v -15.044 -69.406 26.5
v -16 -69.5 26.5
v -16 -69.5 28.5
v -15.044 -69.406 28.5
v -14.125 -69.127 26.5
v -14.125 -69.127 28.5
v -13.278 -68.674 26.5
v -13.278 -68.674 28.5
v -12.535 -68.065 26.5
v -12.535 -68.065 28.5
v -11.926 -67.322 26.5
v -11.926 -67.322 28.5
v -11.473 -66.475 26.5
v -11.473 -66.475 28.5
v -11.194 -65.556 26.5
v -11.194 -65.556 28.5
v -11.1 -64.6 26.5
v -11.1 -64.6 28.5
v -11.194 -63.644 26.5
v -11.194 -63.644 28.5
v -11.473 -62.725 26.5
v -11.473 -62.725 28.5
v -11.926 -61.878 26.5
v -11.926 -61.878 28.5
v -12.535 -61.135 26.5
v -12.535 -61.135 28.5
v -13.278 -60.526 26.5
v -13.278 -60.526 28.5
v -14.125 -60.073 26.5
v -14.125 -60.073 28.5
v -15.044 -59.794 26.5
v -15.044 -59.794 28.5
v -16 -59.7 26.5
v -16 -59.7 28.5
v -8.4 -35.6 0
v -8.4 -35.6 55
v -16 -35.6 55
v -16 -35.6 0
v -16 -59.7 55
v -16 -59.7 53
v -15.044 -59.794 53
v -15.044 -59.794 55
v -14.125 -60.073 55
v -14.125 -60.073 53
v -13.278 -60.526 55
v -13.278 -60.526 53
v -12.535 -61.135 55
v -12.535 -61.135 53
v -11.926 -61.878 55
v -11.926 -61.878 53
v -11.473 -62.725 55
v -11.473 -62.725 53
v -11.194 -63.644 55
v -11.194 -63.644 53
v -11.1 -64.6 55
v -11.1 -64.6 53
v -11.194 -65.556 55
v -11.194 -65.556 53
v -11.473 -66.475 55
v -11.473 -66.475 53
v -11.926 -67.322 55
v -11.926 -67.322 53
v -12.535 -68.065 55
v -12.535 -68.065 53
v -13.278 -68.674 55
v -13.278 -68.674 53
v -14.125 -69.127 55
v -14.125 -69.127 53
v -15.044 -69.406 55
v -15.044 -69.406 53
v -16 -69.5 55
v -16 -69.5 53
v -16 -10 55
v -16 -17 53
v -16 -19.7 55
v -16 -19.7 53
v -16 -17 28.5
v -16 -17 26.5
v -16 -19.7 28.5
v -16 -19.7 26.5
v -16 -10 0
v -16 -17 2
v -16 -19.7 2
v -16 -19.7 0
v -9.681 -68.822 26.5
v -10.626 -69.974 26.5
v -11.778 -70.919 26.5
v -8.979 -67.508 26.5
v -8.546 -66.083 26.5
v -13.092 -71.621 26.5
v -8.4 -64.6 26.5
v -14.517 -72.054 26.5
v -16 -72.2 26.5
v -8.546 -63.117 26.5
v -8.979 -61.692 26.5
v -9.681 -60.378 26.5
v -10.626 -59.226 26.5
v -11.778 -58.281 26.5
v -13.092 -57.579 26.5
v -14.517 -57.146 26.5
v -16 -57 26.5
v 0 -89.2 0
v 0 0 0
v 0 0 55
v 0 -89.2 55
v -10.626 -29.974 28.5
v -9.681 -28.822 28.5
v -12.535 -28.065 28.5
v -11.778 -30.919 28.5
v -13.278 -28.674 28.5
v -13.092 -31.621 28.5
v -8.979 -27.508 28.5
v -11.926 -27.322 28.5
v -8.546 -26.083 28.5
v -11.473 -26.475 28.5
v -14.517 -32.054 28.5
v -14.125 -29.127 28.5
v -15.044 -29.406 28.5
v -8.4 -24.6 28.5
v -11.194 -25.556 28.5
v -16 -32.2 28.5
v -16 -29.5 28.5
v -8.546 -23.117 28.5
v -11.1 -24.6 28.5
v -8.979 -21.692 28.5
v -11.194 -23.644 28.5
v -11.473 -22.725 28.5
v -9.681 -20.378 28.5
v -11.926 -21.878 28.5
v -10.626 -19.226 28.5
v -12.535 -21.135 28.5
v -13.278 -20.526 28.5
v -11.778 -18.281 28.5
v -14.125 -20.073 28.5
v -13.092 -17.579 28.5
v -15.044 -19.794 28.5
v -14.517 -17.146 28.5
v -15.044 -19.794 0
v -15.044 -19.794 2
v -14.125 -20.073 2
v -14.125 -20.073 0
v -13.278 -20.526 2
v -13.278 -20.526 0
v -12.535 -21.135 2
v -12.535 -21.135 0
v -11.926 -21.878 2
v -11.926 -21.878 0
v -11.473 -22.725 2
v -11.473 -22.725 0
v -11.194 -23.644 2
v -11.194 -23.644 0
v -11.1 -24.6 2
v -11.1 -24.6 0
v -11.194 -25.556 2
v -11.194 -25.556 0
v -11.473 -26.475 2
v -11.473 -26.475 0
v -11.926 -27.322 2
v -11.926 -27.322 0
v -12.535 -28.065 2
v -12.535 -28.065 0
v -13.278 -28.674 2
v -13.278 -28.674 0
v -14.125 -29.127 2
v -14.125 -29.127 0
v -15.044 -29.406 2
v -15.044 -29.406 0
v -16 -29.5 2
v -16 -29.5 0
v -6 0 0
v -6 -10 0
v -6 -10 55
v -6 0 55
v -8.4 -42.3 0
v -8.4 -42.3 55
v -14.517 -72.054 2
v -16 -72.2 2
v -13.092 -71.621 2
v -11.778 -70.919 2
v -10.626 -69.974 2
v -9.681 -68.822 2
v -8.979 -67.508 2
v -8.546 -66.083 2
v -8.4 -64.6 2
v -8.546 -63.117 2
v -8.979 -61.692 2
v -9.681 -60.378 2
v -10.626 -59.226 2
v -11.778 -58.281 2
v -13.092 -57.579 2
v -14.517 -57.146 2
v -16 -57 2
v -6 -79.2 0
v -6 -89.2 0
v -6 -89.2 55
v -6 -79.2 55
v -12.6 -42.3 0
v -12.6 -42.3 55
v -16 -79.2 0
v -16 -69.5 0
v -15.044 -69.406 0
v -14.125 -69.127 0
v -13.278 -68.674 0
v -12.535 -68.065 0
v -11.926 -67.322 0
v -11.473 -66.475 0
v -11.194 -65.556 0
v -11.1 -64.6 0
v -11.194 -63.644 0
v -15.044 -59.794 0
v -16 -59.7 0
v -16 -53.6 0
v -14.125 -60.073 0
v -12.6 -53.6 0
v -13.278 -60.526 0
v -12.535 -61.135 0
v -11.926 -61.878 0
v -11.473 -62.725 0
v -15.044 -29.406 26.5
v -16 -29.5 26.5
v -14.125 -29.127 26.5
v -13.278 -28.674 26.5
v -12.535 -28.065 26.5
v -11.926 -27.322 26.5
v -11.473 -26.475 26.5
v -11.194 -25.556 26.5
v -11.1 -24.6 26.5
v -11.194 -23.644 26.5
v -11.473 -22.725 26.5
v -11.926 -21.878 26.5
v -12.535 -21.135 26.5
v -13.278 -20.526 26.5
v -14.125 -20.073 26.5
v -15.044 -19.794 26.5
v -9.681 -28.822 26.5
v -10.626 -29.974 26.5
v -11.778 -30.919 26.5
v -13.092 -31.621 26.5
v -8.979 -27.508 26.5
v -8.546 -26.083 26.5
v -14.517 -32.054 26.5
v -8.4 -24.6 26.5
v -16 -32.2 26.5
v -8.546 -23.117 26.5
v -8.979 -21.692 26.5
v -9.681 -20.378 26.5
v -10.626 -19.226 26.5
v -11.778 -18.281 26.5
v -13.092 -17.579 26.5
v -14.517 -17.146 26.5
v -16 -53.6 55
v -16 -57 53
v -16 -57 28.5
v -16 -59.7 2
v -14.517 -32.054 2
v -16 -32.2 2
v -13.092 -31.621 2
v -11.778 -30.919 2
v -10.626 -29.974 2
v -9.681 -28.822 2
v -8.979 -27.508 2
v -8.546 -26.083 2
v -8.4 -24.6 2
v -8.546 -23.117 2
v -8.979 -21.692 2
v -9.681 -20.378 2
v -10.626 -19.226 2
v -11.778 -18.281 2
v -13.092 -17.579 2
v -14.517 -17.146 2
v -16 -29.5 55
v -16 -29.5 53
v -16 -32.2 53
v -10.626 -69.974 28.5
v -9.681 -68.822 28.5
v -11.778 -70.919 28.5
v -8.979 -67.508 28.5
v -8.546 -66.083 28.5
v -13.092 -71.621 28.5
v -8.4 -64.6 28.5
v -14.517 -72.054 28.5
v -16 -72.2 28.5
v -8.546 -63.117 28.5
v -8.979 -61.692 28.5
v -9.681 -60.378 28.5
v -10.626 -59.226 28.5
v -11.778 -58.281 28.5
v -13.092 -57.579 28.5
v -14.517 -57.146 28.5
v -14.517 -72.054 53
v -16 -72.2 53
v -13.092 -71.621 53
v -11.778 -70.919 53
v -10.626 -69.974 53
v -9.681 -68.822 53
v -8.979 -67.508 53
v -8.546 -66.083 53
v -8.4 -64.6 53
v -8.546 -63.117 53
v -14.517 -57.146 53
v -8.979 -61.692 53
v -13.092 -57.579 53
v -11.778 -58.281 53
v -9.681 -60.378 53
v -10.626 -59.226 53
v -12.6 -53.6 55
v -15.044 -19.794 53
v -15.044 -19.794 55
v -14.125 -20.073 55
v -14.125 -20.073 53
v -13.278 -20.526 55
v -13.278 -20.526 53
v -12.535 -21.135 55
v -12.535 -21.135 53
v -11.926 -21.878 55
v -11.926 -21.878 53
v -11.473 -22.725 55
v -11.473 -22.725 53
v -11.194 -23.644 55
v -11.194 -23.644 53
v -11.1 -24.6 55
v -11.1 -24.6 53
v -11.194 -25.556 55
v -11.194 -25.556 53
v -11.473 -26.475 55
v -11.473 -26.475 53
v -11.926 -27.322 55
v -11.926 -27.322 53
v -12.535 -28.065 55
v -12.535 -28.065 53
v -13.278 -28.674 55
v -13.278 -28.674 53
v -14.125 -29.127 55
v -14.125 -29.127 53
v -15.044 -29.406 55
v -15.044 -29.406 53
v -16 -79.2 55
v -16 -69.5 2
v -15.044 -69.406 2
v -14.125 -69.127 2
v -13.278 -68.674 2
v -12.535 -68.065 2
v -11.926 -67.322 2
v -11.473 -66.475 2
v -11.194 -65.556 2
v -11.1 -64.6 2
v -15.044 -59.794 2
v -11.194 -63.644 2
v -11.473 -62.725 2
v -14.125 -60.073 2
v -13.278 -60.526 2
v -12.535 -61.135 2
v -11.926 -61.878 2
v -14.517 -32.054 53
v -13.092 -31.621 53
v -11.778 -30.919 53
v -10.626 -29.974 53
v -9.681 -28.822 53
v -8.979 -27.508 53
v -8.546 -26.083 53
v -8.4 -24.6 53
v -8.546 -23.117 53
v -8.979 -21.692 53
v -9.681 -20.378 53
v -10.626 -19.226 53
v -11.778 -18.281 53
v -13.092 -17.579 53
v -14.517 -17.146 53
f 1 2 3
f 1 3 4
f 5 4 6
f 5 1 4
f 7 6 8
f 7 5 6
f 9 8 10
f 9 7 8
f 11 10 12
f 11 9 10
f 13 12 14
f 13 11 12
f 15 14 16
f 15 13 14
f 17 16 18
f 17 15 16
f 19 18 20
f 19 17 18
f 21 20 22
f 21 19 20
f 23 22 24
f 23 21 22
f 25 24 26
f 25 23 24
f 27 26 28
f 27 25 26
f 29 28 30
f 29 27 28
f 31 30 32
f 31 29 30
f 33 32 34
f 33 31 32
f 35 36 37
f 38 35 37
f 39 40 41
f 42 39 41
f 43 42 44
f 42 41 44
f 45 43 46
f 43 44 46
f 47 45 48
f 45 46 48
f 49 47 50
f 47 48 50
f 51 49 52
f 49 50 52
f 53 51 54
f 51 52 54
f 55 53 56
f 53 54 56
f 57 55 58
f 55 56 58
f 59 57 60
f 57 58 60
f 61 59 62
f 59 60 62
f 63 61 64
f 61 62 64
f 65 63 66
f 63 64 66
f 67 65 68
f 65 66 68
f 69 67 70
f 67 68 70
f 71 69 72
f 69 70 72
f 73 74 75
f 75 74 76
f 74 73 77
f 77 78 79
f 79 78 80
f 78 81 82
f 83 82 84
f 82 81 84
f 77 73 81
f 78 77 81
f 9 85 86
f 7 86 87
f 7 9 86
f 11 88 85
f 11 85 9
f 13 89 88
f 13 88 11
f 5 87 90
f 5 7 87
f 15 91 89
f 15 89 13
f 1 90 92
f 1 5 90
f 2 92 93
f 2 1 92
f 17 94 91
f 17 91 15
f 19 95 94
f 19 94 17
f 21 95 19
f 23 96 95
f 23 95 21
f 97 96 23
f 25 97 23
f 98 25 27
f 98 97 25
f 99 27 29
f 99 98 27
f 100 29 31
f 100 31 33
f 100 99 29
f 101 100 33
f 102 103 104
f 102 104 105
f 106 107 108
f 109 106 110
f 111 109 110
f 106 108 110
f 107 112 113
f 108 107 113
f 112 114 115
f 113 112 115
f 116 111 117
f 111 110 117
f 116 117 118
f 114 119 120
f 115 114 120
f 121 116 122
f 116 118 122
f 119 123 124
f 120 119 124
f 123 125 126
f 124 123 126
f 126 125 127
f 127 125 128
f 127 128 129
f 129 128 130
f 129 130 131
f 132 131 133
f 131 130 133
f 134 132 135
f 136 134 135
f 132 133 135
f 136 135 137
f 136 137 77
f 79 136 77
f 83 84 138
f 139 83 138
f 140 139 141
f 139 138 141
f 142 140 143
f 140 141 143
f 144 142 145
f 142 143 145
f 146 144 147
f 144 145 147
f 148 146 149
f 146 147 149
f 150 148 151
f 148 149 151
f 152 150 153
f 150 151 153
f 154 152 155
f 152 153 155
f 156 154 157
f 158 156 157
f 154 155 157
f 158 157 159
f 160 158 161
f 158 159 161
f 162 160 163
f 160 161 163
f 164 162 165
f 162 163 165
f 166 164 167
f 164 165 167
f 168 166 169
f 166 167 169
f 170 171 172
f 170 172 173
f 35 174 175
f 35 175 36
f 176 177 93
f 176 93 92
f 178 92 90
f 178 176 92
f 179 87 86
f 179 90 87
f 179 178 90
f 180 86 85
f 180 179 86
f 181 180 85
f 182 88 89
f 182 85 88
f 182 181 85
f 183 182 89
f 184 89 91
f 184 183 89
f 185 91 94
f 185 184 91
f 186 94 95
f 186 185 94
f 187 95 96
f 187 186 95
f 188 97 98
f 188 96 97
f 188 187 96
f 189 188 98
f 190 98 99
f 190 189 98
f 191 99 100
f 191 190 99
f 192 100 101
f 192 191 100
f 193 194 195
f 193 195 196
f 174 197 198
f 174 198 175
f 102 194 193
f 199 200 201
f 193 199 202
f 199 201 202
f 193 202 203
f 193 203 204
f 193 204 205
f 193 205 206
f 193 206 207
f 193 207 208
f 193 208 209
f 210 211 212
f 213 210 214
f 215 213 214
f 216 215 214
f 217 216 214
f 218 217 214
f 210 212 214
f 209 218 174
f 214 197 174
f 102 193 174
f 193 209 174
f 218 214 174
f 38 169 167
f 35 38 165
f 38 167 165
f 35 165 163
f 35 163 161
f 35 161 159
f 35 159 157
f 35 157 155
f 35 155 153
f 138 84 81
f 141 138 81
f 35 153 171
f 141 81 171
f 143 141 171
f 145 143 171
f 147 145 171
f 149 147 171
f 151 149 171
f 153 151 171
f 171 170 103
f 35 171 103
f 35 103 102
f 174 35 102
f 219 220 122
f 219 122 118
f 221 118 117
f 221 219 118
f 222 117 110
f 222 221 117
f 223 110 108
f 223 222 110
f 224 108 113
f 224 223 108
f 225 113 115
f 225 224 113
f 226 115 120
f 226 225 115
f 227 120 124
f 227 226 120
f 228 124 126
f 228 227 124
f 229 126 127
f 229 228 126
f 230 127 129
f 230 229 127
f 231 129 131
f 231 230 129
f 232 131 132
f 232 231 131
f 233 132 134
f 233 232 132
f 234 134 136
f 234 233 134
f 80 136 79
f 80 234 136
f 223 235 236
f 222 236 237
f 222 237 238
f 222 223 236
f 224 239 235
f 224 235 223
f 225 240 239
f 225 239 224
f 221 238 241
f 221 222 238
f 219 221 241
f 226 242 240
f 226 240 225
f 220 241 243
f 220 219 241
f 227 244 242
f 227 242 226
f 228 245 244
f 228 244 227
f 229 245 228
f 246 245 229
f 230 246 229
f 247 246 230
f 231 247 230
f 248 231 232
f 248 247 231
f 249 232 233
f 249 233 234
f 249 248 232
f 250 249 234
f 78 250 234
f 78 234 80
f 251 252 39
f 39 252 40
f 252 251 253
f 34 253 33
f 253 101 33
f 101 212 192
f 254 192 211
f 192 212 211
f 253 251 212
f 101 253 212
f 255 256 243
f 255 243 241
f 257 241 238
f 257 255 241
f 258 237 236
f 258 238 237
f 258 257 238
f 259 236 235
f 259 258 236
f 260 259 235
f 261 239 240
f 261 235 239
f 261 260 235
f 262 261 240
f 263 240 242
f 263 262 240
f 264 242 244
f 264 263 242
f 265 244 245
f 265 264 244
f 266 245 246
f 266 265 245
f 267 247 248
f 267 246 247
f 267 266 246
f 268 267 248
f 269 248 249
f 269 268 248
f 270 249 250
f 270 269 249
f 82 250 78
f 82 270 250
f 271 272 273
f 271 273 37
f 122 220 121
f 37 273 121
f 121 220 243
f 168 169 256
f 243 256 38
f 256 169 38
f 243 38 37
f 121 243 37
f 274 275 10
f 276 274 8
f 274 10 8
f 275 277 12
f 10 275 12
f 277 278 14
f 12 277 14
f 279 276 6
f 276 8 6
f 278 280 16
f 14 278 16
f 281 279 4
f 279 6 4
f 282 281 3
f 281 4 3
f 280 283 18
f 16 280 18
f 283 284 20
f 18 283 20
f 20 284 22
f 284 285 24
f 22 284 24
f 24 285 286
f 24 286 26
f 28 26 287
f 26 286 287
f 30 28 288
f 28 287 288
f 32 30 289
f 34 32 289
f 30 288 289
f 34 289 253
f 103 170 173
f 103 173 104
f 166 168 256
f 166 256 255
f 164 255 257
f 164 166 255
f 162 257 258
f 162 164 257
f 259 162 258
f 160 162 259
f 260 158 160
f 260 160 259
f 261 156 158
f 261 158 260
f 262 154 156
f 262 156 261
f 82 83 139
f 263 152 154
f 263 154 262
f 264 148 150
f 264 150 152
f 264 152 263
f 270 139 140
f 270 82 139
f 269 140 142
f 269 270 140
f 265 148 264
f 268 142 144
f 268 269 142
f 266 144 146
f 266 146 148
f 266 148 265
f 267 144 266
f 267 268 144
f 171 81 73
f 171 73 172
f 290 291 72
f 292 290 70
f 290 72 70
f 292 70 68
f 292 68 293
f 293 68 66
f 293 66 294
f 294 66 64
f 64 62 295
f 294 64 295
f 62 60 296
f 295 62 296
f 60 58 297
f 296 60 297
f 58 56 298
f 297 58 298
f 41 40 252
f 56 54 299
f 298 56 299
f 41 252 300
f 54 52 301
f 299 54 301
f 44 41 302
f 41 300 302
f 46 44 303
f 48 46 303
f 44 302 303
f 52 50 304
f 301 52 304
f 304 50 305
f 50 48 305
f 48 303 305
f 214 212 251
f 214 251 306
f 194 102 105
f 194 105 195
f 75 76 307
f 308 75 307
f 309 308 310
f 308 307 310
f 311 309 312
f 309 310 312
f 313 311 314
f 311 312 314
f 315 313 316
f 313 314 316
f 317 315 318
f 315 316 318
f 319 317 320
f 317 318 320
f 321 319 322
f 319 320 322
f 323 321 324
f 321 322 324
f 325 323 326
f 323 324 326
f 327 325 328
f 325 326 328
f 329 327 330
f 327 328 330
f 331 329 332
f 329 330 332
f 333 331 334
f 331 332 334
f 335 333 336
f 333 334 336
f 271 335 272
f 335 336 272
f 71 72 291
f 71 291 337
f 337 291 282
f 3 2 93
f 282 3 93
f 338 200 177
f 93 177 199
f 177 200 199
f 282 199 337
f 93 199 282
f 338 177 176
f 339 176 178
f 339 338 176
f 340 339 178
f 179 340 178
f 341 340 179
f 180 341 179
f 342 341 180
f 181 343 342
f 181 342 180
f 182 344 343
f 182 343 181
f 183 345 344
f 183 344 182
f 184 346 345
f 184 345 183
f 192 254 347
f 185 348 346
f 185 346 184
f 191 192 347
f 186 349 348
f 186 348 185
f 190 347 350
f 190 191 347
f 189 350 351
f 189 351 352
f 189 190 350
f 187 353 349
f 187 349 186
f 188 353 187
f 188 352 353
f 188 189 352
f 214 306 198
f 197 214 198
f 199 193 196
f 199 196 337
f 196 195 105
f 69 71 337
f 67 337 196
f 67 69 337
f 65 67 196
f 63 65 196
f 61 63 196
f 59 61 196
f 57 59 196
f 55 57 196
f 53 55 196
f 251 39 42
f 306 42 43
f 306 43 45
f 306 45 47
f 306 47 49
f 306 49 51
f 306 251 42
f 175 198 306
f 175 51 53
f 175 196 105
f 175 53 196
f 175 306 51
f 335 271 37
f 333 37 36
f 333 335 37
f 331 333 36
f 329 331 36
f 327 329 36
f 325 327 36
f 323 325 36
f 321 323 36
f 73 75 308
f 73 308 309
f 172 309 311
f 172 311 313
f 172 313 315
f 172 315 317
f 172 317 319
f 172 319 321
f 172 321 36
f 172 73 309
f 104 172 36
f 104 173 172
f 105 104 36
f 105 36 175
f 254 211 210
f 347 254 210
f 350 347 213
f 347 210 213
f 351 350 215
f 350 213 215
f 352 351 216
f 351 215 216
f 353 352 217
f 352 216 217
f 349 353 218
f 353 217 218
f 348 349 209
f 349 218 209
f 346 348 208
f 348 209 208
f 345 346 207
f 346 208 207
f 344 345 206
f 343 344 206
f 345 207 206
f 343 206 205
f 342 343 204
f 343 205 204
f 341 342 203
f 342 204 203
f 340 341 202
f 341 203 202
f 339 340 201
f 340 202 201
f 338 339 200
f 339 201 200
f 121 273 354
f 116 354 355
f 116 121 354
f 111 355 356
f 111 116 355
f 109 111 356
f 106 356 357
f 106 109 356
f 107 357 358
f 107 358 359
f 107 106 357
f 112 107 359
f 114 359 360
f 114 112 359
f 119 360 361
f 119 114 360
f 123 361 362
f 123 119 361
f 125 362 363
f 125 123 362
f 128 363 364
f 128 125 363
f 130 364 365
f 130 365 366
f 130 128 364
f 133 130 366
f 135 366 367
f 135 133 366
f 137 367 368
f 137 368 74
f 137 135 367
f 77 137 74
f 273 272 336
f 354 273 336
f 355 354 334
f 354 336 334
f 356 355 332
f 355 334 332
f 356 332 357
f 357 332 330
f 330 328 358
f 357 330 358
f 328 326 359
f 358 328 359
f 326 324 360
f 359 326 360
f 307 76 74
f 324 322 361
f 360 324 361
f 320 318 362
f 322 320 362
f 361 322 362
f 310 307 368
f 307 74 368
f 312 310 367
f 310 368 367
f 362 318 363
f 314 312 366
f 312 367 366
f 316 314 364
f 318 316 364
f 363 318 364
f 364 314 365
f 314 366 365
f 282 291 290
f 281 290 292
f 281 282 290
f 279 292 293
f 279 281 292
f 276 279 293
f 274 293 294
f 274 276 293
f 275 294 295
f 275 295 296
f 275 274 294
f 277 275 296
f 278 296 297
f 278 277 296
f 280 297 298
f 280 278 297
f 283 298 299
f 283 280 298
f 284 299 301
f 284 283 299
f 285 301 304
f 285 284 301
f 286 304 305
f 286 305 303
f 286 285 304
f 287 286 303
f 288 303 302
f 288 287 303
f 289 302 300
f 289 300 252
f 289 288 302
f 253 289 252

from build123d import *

# Parameters (mm, degrees)
BOSS_EXTRUDE1_DEPTH = 55
BOSS_EXTRUDE2_START = 2
BOSS_EXTRUDE2_DEPTH = 2
BOSS_EXTRUDE3_START = 2
BOSS_EXTRUDE3_DEPTH = 2
BOSS_EXTRUDE5_START = 2
BOSS_EXTRUDE5_DEPTH = 2
BOSS_EXTRUDE6_DEPTH = 2
SKETCH7_W           = 3.4
SKETCH7_H           = 11.3
CUT_EXTRUDE2_DEPTH  = 55


with BuildPart() as part:
    # Sketch1 → Boss-Extrude1 (new body)
    with BuildSketch(Plane.XY):
        with BuildLine():
            Line((0, 0), (0, -89.2))
            Line((0, -89.2), (-6, -89.2))
            Line((-6, -89.2), (-6, -79.2))
            Line((-6, -79.2), (-16, -79.2))
            Line((-16, -79.2), (-16, -72.2))
            ThreePointArc((-16, -72.2), (-8.4, -64.6), (-16, -57))
            Line((-16, -57), (-16, -42.3))
            Line((-16, -42.3), (-8.4, -42.3))
            Line((-8.4, -42.3), (-8.4, -35.6))
            Line((-8.4, -35.6), (-16, -35.6))
            Line((-16, -35.6), (-16, -32.2))
            ThreePointArc((-16, -32.2), (-8.4, -24.6), (-16, -17))
            Line((-16, -17), (-16, -10))
            Line((-16, -10), (-6, -10))
            Line((-6, -10), (-6, 0))
            Line((-6, 0), (0, 0))
        make_face()
    extrude(amount=BOSS_EXTRUDE1_DEPTH)

    # Sketch2 → Boss-Extrude2 (add)
    with BuildSketch(Plane(origin=(0, 0, 28.5), x_dir=(-1, 0, 0), z_dir=(0, 0, -1)).offset(BOSS_EXTRUDE2_START)):
        with BuildLine():
            Line((16, -32.2), (16, -29.5))
            ThreePointArc((16, -29.5), (11.1, -24.6), (16, -19.7))
            Line((16, -19.7), (16, -17))
            ThreePointArc((16, -17), (8.4, -24.6), (16, -32.2))
        make_face()
    extrude(amount=-BOSS_EXTRUDE2_DEPTH)

    # Sketch3 → Boss-Extrude3 (add)
    with BuildSketch(Plane(origin=(0, 0, 28.5), x_dir=(-1, 0, 0), z_dir=(0, 0, -1)).offset(BOSS_EXTRUDE3_START)):
        with BuildLine():
            Line((16, -72.2), (16, -69.5))
            ThreePointArc((16, -69.5), (11.1, -64.6), (16, -59.7))
            Line((16, -59.7), (16, -57))
            ThreePointArc((16, -57), (8.4, -64.6), (16, -72.2))
        make_face()
    extrude(amount=-BOSS_EXTRUDE3_DEPTH)

    # Sketch4 → Boss-Extrude5 (add)
    with BuildSketch(Plane(origin=(0, 0, 2), x_dir=(-1, 0, 0), z_dir=(0, 0, -1)).offset(BOSS_EXTRUDE5_START)):
        with BuildLine():
            Line((16, -57), (16, -59.7))
            ThreePointArc((16, -59.7), (11.1, -64.6), (16, -69.5))
            Line((16, -69.5), (16, -72.2))
            ThreePointArc((16, -72.2), (8.4, -64.6), (16, -57))
        make_face()
        with BuildLine():
            Line((16, -17), (16, -19.7))
            ThreePointArc((16, -19.7), (11.1, -24.6), (16, -29.5))
            Line((16, -29.5), (16, -32.2))
            ThreePointArc((16, -32.2), (8.4, -24.6), (16, -17))
        make_face()
    extrude(amount=-BOSS_EXTRUDE5_DEPTH)

    # Sketch5 → Boss-Extrude6 (add)
    with BuildSketch(Plane(origin=(0, 0, 53), x_dir=(-1, 0, 0), z_dir=(0, 0, -1))):
        with BuildLine():
            Line((16, -17), (16, -19.7))
            ThreePointArc((16, -19.7), (11.1, -24.6), (16, -29.5))
            Line((16, -29.5), (16, -32.2))
            ThreePointArc((16, -32.2), (8.4, -24.6), (16, -17))
        make_face()
        with BuildLine():
            Line((16, -57), (16, -59.7))
            ThreePointArc((16, -59.7), (11.1, -64.6), (16, -69.5))
            Line((16, -69.5), (16, -72.2))
            ThreePointArc((16, -72.2), (8.4, -64.6), (16, -57))
        make_face()
    extrude(amount=-BOSS_EXTRUDE6_DEPTH)

    # Sketch7 → Cut-Extrude2 (cut)
    with BuildSketch(Plane.XY.offset(55)):
        with Locations((-14.3, -47.95)):
            Rectangle(SKETCH7_W, SKETCH7_H)
    extrude(amount=-CUT_EXTRUDE2_DEPTH, mode=Mode.SUBTRACT)


solid = part.part
